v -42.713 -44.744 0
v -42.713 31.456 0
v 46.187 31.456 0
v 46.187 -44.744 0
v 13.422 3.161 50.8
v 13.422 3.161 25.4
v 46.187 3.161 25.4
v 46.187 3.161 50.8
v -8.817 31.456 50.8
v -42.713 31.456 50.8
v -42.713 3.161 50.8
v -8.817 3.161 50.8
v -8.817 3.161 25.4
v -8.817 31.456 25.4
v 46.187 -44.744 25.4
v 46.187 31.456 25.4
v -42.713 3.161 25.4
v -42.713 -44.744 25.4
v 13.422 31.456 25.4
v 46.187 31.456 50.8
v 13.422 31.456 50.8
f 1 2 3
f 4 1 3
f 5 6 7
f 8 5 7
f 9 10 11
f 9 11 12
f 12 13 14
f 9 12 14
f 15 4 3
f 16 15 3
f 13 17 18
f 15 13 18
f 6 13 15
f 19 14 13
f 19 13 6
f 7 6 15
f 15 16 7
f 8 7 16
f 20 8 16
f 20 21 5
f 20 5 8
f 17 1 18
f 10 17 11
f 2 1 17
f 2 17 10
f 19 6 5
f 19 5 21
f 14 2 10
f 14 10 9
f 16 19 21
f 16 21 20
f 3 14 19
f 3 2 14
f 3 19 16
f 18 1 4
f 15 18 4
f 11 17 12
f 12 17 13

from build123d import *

# Parameters (mm, degrees)
F0_W     = 88.9
F0_H     = 76.2
F1_DEPTH = 25.4
F2_W     = 33.895806
F2_H     = 28.295222
F3_DEPTH = 25.4
F2_W_2   = 32.765687
F4_DEPTH = 25.4


with BuildPart() as f1:
    # F0 (on Top) → F1 (new body)
    with BuildSketch(Plane.XY):
        with Locations((1.73725, -6.644126)):
            Rectangle(F0_W, F0_H)
    extrude(amount=F1_DEPTH)

    # F2 (on face) → F3 (join)
    with BuildSketch(Plane.XY.offset(25.4)):
        with Locations((-25.764847, 17.308263)):
            Rectangle(F2_W, F2_H)
    extrude(amount=F3_DEPTH)

    # F2 (on face) → F4 (join)
    with BuildSketch(Plane.XY.offset(25.4)):
        with Locations((29.804406, 17.308263)):
            Rectangle(F2_W_2, F2_H)
    extrude(amount=F4_DEPTH)


solid = f1.part
